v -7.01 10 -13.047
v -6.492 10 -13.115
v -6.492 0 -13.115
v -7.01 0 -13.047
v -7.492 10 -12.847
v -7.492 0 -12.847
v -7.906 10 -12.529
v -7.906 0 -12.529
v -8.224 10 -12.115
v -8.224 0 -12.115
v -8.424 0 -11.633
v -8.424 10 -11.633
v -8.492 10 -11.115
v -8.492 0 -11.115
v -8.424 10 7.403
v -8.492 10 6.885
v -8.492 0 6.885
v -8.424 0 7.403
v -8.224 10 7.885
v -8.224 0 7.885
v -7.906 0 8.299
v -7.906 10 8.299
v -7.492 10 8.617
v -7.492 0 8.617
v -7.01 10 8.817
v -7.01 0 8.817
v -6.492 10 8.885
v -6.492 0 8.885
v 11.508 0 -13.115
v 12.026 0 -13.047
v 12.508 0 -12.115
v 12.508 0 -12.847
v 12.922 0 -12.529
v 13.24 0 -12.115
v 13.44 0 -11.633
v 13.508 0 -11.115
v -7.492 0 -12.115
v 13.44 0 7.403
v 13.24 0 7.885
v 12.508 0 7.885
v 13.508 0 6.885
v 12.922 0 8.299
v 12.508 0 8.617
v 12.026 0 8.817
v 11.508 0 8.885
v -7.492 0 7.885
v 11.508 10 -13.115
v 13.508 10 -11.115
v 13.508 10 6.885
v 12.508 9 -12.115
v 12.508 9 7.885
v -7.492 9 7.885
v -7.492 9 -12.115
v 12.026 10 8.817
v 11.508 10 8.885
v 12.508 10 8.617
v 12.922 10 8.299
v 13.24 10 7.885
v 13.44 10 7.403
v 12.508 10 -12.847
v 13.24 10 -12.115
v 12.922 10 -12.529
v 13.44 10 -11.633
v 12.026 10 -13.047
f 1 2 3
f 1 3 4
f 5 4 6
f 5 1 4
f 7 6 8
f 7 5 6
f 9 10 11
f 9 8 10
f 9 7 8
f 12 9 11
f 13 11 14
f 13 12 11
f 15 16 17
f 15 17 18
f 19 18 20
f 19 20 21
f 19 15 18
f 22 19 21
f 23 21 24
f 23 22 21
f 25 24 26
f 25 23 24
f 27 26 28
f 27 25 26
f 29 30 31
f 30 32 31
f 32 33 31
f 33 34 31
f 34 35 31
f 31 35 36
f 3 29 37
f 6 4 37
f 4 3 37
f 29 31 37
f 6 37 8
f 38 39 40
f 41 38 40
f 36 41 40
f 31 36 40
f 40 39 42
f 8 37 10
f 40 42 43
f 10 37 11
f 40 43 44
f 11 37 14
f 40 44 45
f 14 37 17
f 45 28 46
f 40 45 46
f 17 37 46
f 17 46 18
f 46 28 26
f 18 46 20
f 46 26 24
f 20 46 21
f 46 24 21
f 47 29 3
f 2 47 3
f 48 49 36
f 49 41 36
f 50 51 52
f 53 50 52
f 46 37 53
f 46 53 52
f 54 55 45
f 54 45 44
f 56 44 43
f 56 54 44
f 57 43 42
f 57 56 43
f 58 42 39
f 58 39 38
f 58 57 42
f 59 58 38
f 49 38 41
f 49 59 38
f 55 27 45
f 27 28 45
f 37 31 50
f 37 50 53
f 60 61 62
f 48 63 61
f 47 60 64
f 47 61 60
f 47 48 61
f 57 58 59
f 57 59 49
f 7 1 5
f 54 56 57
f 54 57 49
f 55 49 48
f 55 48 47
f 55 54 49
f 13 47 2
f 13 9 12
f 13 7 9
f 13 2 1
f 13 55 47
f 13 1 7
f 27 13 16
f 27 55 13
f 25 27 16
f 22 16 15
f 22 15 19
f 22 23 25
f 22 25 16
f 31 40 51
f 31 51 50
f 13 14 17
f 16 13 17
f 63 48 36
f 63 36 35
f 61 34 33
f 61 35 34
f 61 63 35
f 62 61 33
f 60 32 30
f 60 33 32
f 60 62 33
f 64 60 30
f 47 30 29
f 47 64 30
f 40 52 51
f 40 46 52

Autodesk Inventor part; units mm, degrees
ref_plane "YZ Plane" through (0, 0, 0) normal (1, 0, 0) x (0, 1, 0)
ref_plane "XZ Plane" through (0, 0, 0) normal (0, 1, 0) x (-1, 0, 0)
ref_plane "XY Plane" through (0, 0, 0) normal (0, 0, 1) x (1, 0, 0)
sketch "Sketch1" plane through (0, 0, 0) normal (0, 1, 0) x (-1, 0, 0)
  line L0 (7.4919, 7.8851) -> (-12.5081, 7.8851)
  line L1 (-12.5081, 7.8851) -> (-12.5081, -12.1149)
  line L2 (-12.5081, -12.1149) -> (7.4919, -12.1149)
  line L3 (7.4919, -12.1149) -> (7.4919, 7.8851)
  line L4 (8.4919, 8.8851) -> (-13.5081, 8.8851)
  line L5 (-13.5081, 8.8851) -> (-13.5081, -13.1149)
  line L6 (-13.5081, -13.1149) -> (8.4919, -13.1149)
  line L7 (8.4919, -13.1149) -> (8.4919, 8.8851)
  point P0 (0, 0)
  dimension "d0" = 20
  dimension "d1" = 20
  dimension "d2" = 22
  dimension "d3" = 22
  dimension "d4" = 1
  dimension "d5" = 1
extrude "Extrusion1" add sketch "Sketch1" along normal blind 10 contours L3 L2 L1 L0 | L7 L6 L5 L4
sketch "Sketch2" plane through (0, 0, 0) normal (0, 1, 0) x (-1, 0, 0)
  line L0 (7.4919, 7.8851) -> (-12.5081, 7.8851)
  line L1 (-12.5081, 7.8851) -> (-12.5081, -12.1149)
  line L2 (-12.5081, -12.1149) -> (7.4919, -12.1149)
  line L3 (7.4919, -12.1149) -> (7.4919, 7.8851)
  line L4 (8.4919, -13.1149) -> (8.4919, 8.8851) projected
  line L5 (8.4919, 8.8851) -> (-13.5081, 8.8851) projected
  point P0 (0, 0)
  dimension "d8" = 20
  dimension "d9" = 20
  dimension "d10" = 1
  dimension "d11" = 1
extrude "Extrusion2" cut sketch "Sketch2" along normal blind 9
fillet "Fillet1" radius 2 4 edges at (-8.4919, 5, 8.8851) (-8.4919, 5, -13.1149) (13.5081, 5, -13.1149) (13.5081, 5, 8.8851)
properties part number "box"
